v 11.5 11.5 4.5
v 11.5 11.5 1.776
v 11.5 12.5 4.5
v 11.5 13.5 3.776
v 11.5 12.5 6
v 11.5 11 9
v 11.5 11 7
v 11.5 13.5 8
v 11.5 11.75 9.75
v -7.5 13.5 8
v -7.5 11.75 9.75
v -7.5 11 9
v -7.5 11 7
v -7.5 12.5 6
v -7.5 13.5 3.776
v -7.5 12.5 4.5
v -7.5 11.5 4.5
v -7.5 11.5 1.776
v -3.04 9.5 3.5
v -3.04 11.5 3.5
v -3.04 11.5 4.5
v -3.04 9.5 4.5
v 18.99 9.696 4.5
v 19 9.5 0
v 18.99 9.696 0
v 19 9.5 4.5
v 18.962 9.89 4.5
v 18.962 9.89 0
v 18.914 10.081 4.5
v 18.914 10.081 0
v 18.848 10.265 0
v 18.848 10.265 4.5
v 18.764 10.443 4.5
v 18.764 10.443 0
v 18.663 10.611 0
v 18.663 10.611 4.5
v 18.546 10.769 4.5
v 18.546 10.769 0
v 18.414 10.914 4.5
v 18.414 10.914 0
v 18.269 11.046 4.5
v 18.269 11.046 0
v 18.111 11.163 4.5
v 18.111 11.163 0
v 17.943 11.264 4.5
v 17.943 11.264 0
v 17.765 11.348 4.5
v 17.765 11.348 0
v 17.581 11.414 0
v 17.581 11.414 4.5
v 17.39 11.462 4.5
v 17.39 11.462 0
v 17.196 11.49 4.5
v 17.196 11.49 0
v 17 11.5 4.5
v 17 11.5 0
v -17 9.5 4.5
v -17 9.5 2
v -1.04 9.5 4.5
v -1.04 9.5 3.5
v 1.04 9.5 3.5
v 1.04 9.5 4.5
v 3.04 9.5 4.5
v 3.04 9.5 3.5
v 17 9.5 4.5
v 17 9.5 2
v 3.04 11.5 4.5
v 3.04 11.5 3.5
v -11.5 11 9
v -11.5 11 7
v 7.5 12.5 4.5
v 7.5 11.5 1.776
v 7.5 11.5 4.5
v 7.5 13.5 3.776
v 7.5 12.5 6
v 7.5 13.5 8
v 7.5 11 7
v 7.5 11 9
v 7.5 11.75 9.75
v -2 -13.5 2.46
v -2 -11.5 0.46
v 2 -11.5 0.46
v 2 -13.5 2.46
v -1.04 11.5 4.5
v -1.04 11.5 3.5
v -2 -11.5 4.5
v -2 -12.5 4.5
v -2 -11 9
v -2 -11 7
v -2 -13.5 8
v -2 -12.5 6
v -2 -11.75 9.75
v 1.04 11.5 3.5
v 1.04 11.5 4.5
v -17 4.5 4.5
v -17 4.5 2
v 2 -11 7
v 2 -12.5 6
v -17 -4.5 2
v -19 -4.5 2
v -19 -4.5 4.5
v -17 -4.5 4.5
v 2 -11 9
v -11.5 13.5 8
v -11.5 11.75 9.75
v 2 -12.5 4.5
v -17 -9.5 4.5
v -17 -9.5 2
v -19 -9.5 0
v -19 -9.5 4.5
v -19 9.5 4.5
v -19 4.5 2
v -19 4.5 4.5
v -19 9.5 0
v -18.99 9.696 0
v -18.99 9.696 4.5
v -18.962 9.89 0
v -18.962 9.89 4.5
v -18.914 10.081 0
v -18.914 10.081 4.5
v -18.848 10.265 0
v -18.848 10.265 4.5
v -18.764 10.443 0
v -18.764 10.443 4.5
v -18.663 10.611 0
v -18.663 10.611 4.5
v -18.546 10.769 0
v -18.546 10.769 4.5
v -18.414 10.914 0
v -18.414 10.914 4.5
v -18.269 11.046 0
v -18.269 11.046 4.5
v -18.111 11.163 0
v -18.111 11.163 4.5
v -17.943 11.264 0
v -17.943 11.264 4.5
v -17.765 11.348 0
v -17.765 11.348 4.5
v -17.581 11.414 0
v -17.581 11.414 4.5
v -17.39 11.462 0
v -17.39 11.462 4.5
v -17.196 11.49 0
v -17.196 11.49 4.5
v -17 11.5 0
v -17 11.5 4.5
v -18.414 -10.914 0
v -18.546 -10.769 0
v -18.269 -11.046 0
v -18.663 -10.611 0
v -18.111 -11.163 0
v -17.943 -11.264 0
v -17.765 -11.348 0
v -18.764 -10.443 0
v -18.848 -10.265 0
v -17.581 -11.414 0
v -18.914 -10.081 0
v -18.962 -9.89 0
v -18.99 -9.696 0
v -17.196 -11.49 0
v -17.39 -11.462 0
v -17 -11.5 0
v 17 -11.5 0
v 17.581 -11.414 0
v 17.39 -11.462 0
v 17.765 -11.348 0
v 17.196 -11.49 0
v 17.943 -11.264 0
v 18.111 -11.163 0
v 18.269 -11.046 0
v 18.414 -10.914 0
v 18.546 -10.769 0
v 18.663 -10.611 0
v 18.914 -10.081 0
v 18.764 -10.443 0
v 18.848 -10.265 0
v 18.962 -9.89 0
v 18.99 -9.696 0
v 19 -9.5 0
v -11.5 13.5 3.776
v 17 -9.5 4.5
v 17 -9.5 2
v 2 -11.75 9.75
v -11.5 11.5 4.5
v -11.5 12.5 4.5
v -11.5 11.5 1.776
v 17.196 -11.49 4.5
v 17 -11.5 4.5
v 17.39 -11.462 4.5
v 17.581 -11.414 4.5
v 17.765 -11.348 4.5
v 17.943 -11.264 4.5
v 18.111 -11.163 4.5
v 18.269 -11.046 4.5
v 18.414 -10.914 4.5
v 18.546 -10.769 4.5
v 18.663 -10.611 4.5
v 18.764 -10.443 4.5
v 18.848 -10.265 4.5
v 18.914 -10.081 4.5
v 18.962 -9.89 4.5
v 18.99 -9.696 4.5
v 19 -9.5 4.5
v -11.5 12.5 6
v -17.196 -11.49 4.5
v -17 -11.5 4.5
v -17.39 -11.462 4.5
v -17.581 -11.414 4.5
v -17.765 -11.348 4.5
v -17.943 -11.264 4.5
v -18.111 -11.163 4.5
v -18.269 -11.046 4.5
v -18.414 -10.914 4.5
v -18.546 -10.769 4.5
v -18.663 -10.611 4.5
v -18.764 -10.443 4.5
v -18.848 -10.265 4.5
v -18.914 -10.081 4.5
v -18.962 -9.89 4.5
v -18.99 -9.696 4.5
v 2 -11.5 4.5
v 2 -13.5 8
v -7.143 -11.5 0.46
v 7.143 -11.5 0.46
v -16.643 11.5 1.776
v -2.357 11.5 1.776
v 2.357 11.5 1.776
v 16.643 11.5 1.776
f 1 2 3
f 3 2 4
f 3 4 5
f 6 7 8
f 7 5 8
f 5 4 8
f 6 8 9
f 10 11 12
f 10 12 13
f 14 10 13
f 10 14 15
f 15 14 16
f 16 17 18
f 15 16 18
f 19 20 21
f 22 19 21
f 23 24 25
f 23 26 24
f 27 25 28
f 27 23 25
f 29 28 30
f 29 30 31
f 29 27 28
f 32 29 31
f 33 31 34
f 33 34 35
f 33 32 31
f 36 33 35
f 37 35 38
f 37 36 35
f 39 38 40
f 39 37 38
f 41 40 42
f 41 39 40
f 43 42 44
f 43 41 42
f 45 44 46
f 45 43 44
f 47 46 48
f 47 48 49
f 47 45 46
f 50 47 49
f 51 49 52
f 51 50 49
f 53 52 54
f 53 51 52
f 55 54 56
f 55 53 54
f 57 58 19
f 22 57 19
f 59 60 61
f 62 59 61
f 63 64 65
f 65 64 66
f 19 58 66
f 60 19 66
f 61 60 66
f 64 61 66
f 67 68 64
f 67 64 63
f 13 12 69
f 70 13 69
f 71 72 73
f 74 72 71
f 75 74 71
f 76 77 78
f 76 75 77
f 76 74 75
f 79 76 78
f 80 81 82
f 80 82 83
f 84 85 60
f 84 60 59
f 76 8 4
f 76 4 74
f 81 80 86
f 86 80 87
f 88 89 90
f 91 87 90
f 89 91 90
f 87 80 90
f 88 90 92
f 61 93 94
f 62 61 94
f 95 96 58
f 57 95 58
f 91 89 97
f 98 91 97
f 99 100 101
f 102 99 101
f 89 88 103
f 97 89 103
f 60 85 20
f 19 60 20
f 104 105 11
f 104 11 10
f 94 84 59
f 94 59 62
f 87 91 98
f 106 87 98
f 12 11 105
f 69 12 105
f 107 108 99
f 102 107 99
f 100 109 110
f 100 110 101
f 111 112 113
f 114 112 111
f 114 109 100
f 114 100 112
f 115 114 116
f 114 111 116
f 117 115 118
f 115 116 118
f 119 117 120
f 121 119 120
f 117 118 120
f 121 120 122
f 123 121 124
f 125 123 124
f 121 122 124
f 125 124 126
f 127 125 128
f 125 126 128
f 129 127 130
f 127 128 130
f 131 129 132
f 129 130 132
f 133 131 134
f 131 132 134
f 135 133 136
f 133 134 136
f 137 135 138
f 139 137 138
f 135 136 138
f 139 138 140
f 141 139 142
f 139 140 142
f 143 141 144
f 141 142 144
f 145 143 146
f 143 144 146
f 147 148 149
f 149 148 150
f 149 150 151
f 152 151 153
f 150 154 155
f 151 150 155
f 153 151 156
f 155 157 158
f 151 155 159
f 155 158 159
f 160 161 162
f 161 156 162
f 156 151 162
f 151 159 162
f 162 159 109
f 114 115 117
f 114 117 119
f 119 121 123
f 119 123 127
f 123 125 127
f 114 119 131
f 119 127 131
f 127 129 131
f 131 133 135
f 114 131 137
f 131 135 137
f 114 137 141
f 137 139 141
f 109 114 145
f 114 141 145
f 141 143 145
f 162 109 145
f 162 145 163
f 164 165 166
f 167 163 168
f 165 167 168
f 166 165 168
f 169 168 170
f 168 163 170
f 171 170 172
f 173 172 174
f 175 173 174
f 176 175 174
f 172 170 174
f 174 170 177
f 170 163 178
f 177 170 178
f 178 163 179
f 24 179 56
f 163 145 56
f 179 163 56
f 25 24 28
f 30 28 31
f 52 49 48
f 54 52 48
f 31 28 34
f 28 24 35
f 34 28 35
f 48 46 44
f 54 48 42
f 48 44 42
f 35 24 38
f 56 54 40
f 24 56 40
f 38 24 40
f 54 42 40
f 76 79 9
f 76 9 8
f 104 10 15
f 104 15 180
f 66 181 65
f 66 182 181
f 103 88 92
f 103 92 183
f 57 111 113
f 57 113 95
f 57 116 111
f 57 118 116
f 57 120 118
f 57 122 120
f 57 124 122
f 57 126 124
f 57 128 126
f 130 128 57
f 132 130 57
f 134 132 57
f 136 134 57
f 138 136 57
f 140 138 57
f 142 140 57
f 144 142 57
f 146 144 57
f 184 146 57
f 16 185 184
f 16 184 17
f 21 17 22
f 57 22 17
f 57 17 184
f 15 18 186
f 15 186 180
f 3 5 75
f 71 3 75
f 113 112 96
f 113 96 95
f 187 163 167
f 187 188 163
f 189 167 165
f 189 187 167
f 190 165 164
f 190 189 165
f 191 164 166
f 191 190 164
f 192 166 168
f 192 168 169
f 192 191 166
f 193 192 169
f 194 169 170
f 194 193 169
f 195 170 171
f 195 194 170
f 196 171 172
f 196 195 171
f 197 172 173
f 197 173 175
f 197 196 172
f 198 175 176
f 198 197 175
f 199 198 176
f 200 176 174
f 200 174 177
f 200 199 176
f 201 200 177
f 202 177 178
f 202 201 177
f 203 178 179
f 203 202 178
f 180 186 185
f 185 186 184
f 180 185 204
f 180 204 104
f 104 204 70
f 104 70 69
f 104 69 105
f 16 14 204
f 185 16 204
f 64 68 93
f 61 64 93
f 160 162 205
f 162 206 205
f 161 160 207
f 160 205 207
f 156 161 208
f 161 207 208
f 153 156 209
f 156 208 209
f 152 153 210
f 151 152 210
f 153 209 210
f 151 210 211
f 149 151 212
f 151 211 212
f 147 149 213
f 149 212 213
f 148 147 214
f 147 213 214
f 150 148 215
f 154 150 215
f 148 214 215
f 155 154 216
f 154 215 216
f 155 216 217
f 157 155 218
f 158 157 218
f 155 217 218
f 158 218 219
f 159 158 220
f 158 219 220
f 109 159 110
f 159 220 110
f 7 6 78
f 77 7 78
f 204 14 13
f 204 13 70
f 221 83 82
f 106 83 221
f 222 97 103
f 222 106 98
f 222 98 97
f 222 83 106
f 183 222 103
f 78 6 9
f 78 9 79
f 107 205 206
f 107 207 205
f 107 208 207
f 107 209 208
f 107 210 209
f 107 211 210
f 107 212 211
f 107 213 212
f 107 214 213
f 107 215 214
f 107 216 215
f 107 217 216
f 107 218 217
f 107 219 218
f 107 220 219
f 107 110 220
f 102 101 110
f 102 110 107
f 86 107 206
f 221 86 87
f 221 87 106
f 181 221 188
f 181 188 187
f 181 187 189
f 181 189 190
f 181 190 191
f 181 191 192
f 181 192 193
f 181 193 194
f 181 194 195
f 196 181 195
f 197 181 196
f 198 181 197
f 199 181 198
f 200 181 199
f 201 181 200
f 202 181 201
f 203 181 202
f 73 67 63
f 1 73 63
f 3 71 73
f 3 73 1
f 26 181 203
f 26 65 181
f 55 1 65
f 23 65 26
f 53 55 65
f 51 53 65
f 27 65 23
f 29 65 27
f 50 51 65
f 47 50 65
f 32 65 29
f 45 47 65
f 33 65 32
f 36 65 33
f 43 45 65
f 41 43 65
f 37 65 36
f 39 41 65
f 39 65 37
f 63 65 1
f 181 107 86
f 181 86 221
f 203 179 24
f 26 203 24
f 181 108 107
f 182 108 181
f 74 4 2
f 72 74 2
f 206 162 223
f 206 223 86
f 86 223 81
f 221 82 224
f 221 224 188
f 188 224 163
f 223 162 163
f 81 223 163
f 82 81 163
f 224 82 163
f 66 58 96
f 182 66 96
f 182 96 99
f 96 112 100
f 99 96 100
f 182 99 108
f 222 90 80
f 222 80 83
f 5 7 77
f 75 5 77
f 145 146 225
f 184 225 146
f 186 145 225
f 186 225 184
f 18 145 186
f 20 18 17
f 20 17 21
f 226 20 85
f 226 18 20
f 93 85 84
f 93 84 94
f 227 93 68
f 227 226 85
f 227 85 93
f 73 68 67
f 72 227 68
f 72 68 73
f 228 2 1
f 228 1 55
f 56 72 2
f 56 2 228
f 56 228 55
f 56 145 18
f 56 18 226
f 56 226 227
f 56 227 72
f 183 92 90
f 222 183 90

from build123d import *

# Parameters (mm, degrees)
F0_W          = 38
F0_H          = 23
F1_DEPTH      = 4.5
F2_T          = -2
F3_W          = 9
F3_H          = 2.5
F4_DEPTH      = 2
F5_W          = 2
F5_H          = 1
F6_DEPTH      = 2
F7_W          = 4
F7_H          = 4
F7_H_2        = 4.2236842105
F8_DEPTH      = 2
F9_DEPTH      = 0.5
F10_W         = 4
F10_H         = 4
F10_H_2       = 5.5396806626
F11_DEPTH     = 2
F12_DEPTH     = 0.5
F13_SIZE2     = 1
F13_SIZE      = 1
F14_T1_DEPTH  = 14.2867319519
F14_T3_DEPTH  = 14.2867319519
F14_T5_DEPTH  = 14.2867319519
F14_T10_DEPTH = 14.2867319519
F14_T15_DEPTH = 14.2867319519
F14_T20_DEPTH = 14.2867319519
F15_R         = 2
F10_H_3       = 1.5
F16_DEPTH     = 1
F7_H_3        = 1.5
F17_DEPTH     = 1
F18_SIZE2     = 0.99999
F18_SIZE      = 1.49999
F19_SIZE2     = 1.49999
F19_SIZE      = 0.99999
F20_SIZE2     = 0.99999
F20_SIZE      = 1.49999


# Not quite as in the source:
# - a fillet or chamfer that OpenCascade refuses, or shapes differently, is made with other operations: its cross-section is extruded or revolved along the edge and cut away or added
# - a fillet or chamfer is up to 0.001 mm smaller than in the source, because OpenCascade refuses the exact size


with BuildPart() as f1:
    # F0 (on Top) → F1 (new body)
    with BuildSketch(Plane.XY):
        Rectangle(F0_W, F0_H)
    extrude(amount=F1_DEPTH)

    # F2
    f2_openings = [f1.faces().sort_by_distance(p)[0] for p in [
        (0, 0, 4.5),
    ]]
    offset(amount=F2_T, openings=f2_openings)

    # F3 (on face) → F4 (cut, through all)
    with BuildSketch(Plane(origin=(-19, 0, 0), x_dir=(0, -1, 0), z_dir=(-1, 0, 0))):
        with Locations((0, 3.25)):
            Rectangle(F3_W, F3_H)
    extrude(amount=-F4_DEPTH, mode=Mode.SUBTRACT)

    # F5 (on face) → F6 (cut, through all)
    with BuildSketch(Plane(origin=(0, 11.5, 0), x_dir=(-1, 0, 0), z_dir=(0, 1, 0))):
        with Locations((-2.0402920675, 4)):
            Rectangle(F5_W, F5_H)
        with Locations((2.0402920675, 4)):
            Rectangle(F5_W, F5_H)
    extrude(amount=-F6_DEPTH, mode=Mode.SUBTRACT)

    # F7 (on face) → F8 (join)
    with BuildSketch(Plane(origin=(0, 11.5, 0), x_dir=(-1, 0, 0), z_dir=(0, 1, 0))):
        with Locations((-9.5, 8)):
            Rectangle(F7_W, F7_H)
        with Locations((-9.5, 3.8881578947)):
            Rectangle(F7_W, F7_H_2)
        with Locations((9.5, 8)):
            Rectangle(F7_W, F7_H)
        with Locations((9.5, 3.8881578947)):
            Rectangle(F7_W, F7_H_2)
    extrude(amount=F8_DEPTH)

    # F7 (on face) → F9 (join)
    with BuildSketch(Plane(origin=(0, 11.5, 0), x_dir=(-1, 0, 0), z_dir=(0, 1, 0))):
        with Locations((-9.5, 8)):
            Rectangle(F7_W, F7_H)
        with Locations((9.5, 8)):
            Rectangle(F7_W, F7_H)
    extrude(amount=-F9_DEPTH)

    # F10 (on face) → F11 (join)
    with BuildSketch(Plane.XZ.offset(11.5)):
        with Locations((0, 8)):
            Rectangle(F10_W, F10_H)
        with Locations((0, 3.2301596687)):
            Rectangle(F10_W, F10_H_2)
    extrude(amount=F11_DEPTH)

    # F10 (on face) → F12 (join)
    with BuildSketch(Plane.XZ.offset(11.5)):
        with Locations((0, 8)):
            Rectangle(F10_W, F10_H)
    extrude(amount=-F12_DEPTH)

    # F13
    f13_edges = [f1.edges().sort_by_distance(p)[0] for p in [
        (0, -11, 10),
        (-9.5, 11, 10),
        (9.5, 11, 10),
    ]]
    chamfer(f13_edges, length=F13_SIZE, length2=F13_SIZE2)

    # F14: chamfer of 2 on 6 edges, made by hand

    # F14_s2 → F14_t1 (cut)
    with BuildSketch(Plane.YZ.offset(2.3566340241)):
        Polygon((11.5, 10), (13.5, 8), (13.5, 10), align=None)
    extrude(amount=F14_T1_DEPTH, mode=Mode.SUBTRACT)

    # F14_s4 → F14_t3 (cut)
    with BuildSketch(Plane.YZ.offset(-16.6433659759)):
        Polygon((11.5, 10), (13.5, 8), (13.5, 10), align=None)
    extrude(amount=F14_T3_DEPTH, mode=Mode.SUBTRACT)

    # F14_s6 → F14_t5 (cut)
    with BuildSketch(Plane.YZ.offset(-7.1433659759)):
        Polygon((-11.5, 10), (-13.5, 8), (-13.5, 10), align=None)
    extrude(amount=F14_T5_DEPTH, mode=Mode.SUBTRACT)


with BuildPart() as f14_tool8:
    # F14_s9 → F14_t10 (new body)
    with BuildSketch(Plane.YZ.offset(-2.3566340241)):
        Polygon((11.5, 1.7763157895), (13.5, 3.7763157895), (13.5, 1.7763157895), align=None)
    extrude(amount=-F14_T10_DEPTH)

    split(bisect_by=Plane.XZ.offset(-11.5), keep=Keep.BOTTOM)


with BuildPart() as f1_1:
    add(f1.part)

    # F14_t7: cut F14_tool8
    add(f14_tool8.part, mode=Mode.SUBTRACT)


with BuildPart() as f14_tool13:
    # F14_s14 → F14_t15 (new body)
    with BuildSketch(Plane.YZ.offset(16.6433659759)):
        Polygon((13.5, 3.7763157895), (11.5, 1.7763157895), (13.5, 1.7763157895), align=None)
    extrude(amount=-F14_T15_DEPTH)

    split(bisect_by=Plane.XZ.offset(-11.5), keep=Keep.BOTTOM)


with BuildPart() as f1_2:
    add(f1_1.part)

    # F14_t12: cut F14_tool13
    add(f14_tool13.part, mode=Mode.SUBTRACT)


with BuildPart() as f14_tool18:
    # F14_s19 → F14_t20 (new body)
    with BuildSketch(Plane.YZ.offset(-7.1433659759)):
        Polygon((-11.5, 0.4603193374), (-13.5, 2.4603193374), (-13.5, 0.4603193374), align=None)
    extrude(amount=F14_T20_DEPTH)

    split(bisect_by=Plane.XZ.offset(11.5), keep=Keep.TOP)


with BuildPart() as f1_3:
    add(f1_2.part)

    # F14_t17: cut F14_tool18
    add(f14_tool18.part, mode=Mode.SUBTRACT)

    # F15
    f15_edges = [f1_3.edges().sort_by_distance(p)[0] for p in [
        (19, -11.5, 2.25),
        (19, 11.5, 2.25),
        (-19, 11.5, 2.25),
        (-19, -11.5, 2.25),
    ]]
    fillet(f15_edges, radius=F15_R)

    # F10 (on face) → F16 (cut)
    with BuildSketch(Plane.XZ.offset(11.5)):
        with Locations((0, 5.25)):
            Rectangle(F10_W, F10_H_3)
    extrude(amount=F16_DEPTH, mode=Mode.SUBTRACT)

    # F7 (on face) → F17 (cut)
    with BuildSketch(Plane(origin=(0, 11.5, 0), x_dir=(-1, 0, 0), z_dir=(0, 1, 0))):
        with Locations((9.5, 5.25)):
            Rectangle(F7_W, F7_H_3)
        with Locations((-9.5, 5.25)):
            Rectangle(F7_W, F7_H_3)
    extrude(amount=F17_DEPTH, mode=Mode.SUBTRACT)

    # F18 (size 1.5 and 1 in the source; OpenCascade refuses exactly that, so slightly less here)
    f18_edges = [f1_3.edges().sort_by_distance(p)[0] for p in [
        (0, -11, 6),
    ]]
    f18_side = f1_3.faces().sort_by_distance((0, -11.75, 6))[0]
    chamfer(f18_edges, length=F18_SIZE, length2=F18_SIZE2, reference=f18_side)

    # F19 (size 1 and 1.5 in the source; OpenCascade refuses exactly that, so slightly less here)
    f19_edges = [f1_3.edges().sort_by_distance(p)[0] for p in [
        (-9.5, 11, 6),
    ]]
    f19_side = f1_3.faces().sort_by_distance((-9.5, 11, 7.5))[0]
    chamfer(f19_edges, length=F19_SIZE, length2=F19_SIZE2, reference=f19_side)

    # F20 (size 1.5 and 1 in the source; OpenCascade refuses exactly that, so slightly less here)
    f20_edges = [f1_3.edges().sort_by_distance(p)[0] for p in [
        (9.5, 11, 6),
    ]]
    f20_side = f1_3.faces().sort_by_distance((9.5, 11.75, 6))[0]
    chamfer(f20_edges, length=F20_SIZE, length2=F20_SIZE2, reference=f20_side)


solid = f1_3.part
